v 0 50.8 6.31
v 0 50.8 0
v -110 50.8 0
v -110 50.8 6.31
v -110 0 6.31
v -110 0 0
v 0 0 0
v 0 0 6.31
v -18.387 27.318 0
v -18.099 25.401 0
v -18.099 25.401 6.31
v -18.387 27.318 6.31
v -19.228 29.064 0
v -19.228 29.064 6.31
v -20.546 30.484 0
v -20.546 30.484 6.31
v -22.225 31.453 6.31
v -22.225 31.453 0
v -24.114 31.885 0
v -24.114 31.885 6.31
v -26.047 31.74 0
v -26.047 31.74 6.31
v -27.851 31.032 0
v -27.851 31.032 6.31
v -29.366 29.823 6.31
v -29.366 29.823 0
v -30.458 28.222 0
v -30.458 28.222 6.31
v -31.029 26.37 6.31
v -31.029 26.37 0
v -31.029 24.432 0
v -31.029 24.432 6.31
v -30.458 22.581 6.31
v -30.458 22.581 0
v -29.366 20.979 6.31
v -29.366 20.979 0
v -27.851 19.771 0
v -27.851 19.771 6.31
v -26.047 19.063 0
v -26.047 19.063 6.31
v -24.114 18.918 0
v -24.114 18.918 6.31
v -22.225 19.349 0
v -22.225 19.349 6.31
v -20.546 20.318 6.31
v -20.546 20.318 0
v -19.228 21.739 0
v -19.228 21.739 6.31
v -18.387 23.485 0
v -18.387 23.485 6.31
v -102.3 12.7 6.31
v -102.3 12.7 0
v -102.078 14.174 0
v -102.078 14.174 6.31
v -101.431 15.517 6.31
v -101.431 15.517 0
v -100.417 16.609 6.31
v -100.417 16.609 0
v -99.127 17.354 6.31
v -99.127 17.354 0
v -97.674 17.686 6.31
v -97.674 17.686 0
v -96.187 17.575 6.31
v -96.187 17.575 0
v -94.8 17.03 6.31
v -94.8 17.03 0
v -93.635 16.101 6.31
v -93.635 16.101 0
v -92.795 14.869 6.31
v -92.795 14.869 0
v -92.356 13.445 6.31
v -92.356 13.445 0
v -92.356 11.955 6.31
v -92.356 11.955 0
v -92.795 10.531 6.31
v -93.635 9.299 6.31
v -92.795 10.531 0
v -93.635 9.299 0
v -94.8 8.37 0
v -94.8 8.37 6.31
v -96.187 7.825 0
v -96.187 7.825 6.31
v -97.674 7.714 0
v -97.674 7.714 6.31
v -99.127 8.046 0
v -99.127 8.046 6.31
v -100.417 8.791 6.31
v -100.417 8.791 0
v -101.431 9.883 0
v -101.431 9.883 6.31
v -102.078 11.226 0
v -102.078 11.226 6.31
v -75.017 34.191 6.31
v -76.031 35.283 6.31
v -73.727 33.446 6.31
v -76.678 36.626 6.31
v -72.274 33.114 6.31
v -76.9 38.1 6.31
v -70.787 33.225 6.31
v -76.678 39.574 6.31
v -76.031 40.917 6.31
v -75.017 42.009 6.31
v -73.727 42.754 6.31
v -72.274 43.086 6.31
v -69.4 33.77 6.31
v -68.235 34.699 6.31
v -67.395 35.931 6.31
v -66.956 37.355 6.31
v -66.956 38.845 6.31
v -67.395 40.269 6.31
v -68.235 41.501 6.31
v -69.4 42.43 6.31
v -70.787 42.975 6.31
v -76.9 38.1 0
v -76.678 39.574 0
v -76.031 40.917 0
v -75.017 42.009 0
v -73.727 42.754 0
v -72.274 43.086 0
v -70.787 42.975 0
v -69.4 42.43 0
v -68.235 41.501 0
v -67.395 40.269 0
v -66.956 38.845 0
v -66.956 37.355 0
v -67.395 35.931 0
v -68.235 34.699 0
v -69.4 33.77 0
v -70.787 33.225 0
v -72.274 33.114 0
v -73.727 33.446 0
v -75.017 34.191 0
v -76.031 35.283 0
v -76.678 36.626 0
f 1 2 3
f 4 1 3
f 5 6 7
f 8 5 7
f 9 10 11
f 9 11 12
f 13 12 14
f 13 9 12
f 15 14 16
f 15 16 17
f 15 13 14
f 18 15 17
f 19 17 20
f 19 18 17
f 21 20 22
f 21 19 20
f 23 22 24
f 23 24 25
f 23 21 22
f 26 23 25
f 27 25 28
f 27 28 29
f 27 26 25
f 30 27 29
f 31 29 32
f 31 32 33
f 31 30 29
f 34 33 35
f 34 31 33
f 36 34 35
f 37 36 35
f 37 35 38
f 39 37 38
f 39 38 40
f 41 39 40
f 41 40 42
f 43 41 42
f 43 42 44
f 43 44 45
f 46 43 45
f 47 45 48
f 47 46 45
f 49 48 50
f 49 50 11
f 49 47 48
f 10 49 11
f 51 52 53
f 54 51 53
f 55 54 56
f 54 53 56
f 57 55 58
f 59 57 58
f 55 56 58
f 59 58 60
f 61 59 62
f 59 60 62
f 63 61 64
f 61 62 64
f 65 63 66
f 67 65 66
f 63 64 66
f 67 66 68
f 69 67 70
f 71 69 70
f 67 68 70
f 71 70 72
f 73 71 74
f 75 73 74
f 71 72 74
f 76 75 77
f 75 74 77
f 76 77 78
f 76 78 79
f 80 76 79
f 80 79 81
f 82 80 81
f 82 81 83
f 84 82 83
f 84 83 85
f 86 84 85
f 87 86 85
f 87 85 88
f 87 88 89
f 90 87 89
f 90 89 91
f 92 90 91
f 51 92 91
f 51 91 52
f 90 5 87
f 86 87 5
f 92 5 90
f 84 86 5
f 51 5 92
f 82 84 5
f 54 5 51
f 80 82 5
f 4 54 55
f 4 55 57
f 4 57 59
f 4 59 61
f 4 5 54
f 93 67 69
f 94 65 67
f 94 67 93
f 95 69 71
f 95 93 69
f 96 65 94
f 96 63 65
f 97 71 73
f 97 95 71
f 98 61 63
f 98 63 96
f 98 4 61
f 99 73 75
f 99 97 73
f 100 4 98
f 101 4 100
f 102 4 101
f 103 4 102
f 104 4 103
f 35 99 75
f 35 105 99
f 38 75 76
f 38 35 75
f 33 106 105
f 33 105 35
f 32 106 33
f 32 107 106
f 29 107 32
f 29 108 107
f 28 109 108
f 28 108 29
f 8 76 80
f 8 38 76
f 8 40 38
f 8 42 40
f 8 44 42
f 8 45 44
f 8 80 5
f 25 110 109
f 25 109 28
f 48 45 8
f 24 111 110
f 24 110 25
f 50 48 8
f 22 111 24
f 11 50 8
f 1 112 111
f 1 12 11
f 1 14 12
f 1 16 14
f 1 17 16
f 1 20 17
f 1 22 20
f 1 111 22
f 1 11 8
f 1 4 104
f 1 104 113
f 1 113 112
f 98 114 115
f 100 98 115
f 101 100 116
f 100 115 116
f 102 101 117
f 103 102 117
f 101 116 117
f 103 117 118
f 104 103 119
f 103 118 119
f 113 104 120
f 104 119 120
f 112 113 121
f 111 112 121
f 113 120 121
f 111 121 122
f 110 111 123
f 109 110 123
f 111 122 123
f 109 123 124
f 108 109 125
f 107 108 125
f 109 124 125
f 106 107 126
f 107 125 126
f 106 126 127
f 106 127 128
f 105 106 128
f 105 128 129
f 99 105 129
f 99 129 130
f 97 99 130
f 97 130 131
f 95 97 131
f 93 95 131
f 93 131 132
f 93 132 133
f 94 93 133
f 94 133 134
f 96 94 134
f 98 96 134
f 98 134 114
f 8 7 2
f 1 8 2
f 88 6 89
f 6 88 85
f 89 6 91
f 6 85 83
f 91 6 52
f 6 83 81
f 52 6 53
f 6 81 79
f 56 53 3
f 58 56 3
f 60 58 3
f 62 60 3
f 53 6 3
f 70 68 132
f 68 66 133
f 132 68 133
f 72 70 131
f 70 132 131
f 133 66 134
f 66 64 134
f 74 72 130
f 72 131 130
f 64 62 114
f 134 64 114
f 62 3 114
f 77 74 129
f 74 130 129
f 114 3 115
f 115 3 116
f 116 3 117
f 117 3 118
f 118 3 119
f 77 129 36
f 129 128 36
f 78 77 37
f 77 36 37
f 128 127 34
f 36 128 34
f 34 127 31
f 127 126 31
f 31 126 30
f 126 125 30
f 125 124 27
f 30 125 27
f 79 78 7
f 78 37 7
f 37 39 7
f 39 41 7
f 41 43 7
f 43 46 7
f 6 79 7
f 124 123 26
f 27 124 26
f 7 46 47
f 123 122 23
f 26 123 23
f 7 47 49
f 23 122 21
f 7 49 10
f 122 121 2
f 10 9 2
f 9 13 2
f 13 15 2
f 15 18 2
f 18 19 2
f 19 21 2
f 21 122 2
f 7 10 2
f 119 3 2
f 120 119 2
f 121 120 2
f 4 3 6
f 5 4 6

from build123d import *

# Parameters (mm, degrees)
CROQUIS1_R              = 6.501341754
SALIENTE_EXTRUIR1_DEPTH = 6.31
CROQUIS2_R              = 5
CORTAR_EXTRUIR1_DEPTH   = 10


with BuildPart() as part:
    # Croquis1 → Saliente-Extruir1 (new body)
    with BuildSketch(Plane.XY):
        Polygon((-59.2, 50.8), (-110, 50.8), (-110, 0), (0, 0), (0, 50.8), align=None)
        with Locations((-24.6, 25.401341754)):
            Circle(CROQUIS1_R, mode=Mode.SUBTRACT)
    extrude(amount=SALIENTE_EXTRUIR1_DEPTH)

    # Croquis2 → Cortar-Extruir1 (cut)
    with BuildSketch(Plane(origin=(0, 0, 0), x_dir=(-1, 0, 0), z_dir=(0, 0, -1))):
        with Locations((97.3, 12.7)):
            Circle(CROQUIS2_R)
        with Locations((71.9, 38.1)):
            Circle(CROQUIS2_R)
    extrude(amount=-CORTAR_EXTRUIR1_DEPTH, mode=Mode.SUBTRACT)


solid = part.part
